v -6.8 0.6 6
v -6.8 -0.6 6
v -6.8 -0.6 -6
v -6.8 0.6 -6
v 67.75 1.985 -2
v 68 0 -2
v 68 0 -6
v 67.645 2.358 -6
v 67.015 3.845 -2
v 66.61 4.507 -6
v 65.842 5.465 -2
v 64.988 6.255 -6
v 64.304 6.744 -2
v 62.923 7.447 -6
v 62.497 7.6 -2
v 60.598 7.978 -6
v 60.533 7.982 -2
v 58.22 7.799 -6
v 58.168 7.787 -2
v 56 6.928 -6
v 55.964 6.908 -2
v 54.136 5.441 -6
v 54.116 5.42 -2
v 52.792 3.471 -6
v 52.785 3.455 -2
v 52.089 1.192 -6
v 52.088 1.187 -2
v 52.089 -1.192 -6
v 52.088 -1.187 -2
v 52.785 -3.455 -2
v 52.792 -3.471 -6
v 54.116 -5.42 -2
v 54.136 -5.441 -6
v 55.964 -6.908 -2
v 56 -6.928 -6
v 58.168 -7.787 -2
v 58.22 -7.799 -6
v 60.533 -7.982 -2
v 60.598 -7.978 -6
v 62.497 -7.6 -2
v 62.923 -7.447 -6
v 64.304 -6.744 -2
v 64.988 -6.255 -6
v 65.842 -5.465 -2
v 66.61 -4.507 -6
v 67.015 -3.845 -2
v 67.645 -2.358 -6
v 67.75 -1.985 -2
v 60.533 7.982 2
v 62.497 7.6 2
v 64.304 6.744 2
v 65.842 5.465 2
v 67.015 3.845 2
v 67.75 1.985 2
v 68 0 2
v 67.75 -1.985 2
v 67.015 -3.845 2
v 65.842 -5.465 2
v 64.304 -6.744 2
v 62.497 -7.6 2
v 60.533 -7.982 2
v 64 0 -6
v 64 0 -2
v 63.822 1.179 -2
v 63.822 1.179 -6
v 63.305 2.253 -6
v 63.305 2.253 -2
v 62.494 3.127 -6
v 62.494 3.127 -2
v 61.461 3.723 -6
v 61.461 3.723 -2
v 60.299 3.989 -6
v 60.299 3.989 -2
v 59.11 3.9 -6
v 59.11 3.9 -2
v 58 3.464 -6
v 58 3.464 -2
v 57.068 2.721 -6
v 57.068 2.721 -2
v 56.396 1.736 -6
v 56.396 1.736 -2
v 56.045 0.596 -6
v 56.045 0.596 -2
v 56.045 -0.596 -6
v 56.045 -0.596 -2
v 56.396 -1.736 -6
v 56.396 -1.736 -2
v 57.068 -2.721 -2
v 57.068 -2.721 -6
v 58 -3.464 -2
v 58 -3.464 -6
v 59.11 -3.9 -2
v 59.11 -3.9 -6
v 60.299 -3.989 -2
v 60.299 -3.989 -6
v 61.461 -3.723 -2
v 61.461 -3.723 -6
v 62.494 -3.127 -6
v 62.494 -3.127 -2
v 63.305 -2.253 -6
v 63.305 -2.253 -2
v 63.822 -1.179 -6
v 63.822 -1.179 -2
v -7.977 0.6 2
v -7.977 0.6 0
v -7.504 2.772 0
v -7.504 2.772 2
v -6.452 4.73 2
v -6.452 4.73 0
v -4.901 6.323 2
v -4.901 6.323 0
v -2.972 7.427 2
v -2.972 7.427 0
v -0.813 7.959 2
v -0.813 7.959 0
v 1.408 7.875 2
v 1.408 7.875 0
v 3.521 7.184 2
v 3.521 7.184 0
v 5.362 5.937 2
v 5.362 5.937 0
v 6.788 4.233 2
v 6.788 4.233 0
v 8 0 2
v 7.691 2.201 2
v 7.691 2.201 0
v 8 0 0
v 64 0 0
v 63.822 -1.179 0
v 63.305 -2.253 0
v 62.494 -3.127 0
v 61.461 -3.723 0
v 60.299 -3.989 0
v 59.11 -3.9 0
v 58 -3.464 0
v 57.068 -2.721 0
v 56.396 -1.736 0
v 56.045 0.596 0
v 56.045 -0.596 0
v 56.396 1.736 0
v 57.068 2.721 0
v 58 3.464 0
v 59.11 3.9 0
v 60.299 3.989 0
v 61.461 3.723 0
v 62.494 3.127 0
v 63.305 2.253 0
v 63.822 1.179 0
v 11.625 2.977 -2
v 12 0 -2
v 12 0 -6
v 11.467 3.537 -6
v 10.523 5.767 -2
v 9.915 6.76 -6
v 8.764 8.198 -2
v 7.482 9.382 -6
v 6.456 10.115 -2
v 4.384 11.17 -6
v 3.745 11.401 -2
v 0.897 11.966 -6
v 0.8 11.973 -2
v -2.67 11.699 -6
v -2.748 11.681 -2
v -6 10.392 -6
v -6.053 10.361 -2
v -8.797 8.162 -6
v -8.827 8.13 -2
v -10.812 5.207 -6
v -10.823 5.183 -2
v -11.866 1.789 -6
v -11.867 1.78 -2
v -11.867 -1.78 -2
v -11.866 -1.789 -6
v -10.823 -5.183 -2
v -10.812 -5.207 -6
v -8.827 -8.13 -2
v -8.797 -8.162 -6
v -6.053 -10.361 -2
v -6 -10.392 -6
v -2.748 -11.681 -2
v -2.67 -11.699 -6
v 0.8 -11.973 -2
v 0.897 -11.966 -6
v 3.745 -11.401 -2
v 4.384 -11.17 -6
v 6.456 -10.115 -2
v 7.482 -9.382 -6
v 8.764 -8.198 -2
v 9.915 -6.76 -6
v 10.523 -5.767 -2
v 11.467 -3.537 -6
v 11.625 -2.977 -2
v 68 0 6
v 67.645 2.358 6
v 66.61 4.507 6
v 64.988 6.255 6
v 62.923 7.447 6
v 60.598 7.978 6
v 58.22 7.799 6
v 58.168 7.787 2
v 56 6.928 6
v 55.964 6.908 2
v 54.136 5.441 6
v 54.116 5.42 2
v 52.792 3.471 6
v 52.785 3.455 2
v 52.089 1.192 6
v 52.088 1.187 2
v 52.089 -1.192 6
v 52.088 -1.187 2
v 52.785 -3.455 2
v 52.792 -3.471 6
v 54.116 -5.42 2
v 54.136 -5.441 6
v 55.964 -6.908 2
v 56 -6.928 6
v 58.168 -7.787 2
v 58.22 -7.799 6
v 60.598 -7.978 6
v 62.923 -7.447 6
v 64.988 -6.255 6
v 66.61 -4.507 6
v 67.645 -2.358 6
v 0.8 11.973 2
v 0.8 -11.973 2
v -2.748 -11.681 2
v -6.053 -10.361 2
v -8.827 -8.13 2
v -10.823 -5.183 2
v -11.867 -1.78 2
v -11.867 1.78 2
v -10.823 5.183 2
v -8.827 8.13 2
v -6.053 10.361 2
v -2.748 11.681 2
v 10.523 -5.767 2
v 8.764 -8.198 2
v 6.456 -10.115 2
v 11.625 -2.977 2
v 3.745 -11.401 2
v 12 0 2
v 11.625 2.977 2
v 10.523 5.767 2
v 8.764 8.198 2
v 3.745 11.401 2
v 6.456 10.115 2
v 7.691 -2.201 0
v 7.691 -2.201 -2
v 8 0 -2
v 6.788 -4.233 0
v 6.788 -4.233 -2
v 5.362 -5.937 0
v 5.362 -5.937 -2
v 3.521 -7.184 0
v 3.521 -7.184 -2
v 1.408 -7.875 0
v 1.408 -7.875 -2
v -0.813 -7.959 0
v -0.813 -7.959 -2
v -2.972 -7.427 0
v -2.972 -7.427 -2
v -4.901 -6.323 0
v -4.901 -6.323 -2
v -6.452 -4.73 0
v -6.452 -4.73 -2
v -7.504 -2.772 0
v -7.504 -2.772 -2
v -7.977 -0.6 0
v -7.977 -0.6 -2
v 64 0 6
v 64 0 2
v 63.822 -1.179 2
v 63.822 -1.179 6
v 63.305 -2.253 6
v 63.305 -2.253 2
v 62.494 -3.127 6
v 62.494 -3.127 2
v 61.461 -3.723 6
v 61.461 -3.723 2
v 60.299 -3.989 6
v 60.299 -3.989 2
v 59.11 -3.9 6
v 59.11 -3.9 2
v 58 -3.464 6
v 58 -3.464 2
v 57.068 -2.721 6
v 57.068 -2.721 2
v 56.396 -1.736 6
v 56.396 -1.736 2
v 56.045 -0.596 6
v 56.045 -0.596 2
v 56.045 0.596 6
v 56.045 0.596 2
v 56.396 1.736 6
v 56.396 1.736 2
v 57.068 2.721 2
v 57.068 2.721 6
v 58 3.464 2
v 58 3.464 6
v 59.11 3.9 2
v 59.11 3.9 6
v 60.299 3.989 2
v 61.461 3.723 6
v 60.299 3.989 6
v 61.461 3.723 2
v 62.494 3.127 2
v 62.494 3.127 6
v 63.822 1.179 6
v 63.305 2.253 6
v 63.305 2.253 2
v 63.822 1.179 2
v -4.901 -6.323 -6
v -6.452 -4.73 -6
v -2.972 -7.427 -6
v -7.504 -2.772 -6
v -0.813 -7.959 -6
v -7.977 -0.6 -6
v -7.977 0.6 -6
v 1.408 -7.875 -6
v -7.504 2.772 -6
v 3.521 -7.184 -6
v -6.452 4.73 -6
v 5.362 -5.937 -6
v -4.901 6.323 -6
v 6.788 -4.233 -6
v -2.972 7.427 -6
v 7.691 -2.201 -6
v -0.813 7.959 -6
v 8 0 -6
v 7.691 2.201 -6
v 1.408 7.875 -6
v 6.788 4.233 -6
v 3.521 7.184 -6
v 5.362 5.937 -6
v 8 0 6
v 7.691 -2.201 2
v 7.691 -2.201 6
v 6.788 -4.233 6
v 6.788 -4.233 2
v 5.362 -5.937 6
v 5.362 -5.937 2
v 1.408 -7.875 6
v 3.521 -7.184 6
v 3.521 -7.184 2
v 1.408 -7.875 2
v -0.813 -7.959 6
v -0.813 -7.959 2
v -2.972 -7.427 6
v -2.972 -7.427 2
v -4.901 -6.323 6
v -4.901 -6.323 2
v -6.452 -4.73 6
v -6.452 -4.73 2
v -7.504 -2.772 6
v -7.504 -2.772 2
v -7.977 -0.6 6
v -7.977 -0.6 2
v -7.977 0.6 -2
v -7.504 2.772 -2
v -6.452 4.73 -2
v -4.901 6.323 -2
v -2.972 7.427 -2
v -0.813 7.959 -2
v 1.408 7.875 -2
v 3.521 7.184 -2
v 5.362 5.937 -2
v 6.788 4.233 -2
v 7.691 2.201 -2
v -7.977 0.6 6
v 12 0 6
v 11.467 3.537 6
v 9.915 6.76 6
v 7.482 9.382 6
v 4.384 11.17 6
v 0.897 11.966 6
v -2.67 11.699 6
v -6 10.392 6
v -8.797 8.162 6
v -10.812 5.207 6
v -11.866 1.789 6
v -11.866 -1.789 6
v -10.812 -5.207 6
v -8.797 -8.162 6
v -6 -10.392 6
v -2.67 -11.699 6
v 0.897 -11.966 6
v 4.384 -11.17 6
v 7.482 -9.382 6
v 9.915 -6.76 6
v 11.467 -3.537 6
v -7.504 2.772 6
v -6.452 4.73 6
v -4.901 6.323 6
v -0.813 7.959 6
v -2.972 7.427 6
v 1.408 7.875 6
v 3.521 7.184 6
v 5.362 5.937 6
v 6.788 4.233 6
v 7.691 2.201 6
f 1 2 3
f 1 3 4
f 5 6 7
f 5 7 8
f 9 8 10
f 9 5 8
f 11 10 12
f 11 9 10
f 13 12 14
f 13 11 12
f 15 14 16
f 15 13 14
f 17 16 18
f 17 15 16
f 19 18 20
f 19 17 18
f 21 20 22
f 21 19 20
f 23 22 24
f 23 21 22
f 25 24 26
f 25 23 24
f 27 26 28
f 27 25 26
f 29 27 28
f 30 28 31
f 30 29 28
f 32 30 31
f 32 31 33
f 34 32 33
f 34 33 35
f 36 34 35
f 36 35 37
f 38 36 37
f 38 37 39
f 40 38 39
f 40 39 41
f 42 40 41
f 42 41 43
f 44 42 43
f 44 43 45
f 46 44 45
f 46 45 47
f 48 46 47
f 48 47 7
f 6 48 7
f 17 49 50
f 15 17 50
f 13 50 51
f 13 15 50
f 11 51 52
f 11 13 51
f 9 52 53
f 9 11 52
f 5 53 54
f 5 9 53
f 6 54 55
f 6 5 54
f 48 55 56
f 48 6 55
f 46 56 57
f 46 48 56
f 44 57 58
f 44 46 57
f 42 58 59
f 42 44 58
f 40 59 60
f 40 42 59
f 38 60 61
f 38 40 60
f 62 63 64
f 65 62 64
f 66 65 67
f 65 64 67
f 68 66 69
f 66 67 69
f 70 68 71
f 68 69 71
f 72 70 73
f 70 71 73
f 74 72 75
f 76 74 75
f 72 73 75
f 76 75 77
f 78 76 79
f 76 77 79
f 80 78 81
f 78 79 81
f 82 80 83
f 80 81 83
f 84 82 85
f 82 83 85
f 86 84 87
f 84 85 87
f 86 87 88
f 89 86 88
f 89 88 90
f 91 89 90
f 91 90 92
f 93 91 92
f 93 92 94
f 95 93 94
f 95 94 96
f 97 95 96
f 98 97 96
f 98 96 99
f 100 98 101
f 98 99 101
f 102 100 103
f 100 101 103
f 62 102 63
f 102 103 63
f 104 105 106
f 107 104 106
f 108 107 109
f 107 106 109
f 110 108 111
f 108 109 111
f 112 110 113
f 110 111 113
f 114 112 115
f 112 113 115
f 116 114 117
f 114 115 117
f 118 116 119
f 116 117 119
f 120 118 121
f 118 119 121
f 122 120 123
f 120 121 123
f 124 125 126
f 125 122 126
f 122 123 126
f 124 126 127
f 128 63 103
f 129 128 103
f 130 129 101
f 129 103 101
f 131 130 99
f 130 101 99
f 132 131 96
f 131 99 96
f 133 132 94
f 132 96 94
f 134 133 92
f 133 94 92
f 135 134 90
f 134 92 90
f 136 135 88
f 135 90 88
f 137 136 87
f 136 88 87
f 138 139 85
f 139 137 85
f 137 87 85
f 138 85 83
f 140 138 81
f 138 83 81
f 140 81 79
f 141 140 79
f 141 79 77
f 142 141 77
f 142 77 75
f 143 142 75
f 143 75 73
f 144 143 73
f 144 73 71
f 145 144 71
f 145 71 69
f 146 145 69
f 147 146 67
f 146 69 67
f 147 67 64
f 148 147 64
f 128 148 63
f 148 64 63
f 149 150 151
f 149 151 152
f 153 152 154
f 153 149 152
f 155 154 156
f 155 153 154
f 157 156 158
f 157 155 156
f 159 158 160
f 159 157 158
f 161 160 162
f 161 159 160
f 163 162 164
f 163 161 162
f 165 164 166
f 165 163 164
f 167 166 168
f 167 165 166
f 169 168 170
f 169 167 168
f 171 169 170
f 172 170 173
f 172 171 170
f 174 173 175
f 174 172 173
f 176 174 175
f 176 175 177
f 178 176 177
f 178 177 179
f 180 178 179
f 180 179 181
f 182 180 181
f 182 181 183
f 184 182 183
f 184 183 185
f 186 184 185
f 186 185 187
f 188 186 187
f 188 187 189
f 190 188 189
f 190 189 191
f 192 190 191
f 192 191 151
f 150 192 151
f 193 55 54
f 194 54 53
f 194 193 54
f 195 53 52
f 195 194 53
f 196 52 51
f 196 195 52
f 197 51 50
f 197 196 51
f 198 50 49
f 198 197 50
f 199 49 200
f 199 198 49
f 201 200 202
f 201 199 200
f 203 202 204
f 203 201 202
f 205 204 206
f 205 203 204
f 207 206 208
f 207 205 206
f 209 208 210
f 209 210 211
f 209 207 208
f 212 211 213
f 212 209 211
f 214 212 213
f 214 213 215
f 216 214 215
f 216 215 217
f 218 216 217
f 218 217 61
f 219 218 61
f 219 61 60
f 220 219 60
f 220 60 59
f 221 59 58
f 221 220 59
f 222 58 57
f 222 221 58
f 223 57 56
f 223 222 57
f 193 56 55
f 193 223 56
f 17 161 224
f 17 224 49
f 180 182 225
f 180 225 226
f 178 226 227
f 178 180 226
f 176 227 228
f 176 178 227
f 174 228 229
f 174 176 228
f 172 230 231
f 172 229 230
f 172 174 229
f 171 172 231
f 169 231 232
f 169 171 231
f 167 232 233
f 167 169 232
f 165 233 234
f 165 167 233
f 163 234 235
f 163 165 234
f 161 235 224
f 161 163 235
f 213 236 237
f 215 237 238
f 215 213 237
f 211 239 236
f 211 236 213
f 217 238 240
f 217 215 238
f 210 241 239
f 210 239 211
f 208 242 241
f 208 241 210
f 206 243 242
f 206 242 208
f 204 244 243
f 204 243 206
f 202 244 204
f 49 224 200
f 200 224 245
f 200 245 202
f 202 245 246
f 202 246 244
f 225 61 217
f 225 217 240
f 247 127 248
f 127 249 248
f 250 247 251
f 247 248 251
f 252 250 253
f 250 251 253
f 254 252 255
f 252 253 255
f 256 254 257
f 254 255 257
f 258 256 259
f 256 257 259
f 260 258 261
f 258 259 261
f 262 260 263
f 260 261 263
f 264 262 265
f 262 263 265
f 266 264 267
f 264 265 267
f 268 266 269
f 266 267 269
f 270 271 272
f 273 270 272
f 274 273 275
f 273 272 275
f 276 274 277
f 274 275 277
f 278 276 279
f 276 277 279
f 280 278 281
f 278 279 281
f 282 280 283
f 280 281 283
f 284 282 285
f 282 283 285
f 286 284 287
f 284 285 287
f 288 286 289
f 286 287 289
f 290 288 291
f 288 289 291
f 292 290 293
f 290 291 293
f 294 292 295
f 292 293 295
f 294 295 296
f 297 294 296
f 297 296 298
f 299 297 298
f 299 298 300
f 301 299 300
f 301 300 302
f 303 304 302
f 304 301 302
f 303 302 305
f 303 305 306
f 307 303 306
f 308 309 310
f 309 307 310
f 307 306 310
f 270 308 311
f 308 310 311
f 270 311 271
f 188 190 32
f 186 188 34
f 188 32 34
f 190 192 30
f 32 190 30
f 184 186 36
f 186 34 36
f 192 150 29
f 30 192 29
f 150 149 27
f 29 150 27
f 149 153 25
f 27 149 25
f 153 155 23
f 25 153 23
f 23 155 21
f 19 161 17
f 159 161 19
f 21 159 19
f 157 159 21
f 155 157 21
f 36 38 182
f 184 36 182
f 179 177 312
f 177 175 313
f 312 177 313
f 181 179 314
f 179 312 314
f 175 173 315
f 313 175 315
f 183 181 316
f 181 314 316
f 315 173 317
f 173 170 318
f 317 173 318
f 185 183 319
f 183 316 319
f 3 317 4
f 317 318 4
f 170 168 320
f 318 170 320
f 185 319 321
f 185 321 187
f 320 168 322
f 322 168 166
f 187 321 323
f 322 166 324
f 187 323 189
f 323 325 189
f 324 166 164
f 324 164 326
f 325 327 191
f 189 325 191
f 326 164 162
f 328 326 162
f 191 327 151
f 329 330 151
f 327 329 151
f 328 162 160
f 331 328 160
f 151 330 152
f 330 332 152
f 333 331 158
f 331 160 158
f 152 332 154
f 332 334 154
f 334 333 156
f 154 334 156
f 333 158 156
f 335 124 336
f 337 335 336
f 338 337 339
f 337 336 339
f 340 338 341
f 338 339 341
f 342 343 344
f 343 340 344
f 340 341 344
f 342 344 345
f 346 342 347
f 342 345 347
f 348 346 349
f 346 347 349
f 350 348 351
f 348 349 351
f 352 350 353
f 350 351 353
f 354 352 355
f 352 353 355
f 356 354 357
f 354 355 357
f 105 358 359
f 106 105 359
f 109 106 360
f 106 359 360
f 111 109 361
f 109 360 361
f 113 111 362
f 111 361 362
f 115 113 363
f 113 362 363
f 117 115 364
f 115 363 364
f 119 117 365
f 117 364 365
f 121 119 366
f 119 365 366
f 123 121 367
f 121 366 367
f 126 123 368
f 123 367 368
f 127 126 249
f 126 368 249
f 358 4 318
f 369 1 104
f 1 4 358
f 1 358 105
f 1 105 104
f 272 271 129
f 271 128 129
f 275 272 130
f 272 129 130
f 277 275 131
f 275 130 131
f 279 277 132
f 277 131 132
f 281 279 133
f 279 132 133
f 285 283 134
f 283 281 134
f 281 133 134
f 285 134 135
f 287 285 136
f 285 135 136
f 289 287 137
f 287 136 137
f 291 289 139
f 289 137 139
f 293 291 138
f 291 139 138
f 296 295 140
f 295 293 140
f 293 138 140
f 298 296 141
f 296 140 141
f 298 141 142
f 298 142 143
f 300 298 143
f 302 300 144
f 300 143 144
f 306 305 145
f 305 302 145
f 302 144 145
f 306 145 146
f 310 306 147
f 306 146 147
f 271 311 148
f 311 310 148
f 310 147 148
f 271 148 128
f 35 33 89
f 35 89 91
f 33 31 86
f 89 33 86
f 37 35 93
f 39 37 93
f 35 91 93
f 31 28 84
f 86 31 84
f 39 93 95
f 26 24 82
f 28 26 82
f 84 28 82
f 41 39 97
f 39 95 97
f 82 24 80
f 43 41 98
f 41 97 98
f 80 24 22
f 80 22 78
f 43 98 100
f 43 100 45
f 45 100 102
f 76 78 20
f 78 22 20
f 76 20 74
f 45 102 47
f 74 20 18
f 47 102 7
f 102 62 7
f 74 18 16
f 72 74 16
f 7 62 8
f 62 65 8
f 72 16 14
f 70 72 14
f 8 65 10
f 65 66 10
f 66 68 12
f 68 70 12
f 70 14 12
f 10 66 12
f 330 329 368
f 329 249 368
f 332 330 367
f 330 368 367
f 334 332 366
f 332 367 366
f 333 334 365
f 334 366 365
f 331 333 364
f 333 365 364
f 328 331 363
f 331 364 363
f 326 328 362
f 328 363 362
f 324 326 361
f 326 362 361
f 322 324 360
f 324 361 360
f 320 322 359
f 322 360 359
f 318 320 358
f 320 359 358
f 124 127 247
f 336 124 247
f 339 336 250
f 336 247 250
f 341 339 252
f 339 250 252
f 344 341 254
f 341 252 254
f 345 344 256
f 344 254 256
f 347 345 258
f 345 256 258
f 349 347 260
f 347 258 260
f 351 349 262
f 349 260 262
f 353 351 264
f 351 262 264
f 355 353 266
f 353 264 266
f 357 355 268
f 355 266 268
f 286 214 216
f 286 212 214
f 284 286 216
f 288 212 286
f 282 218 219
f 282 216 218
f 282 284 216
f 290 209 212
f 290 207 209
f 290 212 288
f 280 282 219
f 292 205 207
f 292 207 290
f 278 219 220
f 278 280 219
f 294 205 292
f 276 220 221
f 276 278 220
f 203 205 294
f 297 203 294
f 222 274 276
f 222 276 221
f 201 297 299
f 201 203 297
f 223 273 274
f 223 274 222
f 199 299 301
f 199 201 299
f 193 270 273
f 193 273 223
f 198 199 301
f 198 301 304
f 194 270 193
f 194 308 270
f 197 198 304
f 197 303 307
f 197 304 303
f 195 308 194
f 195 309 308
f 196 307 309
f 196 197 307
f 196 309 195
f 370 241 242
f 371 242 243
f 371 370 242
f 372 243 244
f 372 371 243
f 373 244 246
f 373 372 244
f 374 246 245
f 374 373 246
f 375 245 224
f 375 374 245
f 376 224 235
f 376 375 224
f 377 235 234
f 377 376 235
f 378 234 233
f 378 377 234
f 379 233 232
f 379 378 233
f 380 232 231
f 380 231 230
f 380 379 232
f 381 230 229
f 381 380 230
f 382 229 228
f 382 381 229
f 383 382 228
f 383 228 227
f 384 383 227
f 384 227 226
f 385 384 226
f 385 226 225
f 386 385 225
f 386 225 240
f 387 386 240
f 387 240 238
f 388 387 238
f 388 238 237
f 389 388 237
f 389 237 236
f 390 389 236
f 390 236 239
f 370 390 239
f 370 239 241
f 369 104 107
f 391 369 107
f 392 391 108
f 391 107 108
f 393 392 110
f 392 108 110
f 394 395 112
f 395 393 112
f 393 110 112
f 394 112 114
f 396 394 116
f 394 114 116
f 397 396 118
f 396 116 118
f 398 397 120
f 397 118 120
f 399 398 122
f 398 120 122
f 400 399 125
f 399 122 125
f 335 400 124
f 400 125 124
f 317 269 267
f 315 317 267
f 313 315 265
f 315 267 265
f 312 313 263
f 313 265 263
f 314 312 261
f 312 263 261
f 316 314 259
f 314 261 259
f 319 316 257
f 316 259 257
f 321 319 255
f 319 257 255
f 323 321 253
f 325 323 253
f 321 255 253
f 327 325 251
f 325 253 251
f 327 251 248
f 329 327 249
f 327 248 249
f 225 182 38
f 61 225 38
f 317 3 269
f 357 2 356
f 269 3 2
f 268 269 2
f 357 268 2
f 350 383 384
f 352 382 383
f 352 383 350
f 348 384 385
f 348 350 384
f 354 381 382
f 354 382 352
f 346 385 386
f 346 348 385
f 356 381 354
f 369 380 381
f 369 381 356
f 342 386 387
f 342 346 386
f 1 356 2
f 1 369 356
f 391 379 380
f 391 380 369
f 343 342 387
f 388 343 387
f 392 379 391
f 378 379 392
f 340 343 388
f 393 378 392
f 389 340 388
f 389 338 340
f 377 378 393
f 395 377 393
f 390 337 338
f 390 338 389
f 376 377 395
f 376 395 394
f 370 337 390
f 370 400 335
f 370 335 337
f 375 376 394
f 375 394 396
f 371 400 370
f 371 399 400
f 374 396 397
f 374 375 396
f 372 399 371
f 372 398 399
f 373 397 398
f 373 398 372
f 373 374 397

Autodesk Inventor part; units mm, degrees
ref_plane "YZ Plane" through (0, 0, 0) normal (1, 0, 0) x (0, 1, 0)
ref_plane "XZ Plane" through (0, 0, 0) normal (0, 1, 0) x (-1, 0, 0)
ref_plane "XY Plane" through (0, 0, 0) normal (0, 0, 1) x (1, 0, 0)
sketch "Esboço1" plane through (0, 0, 0) normal (0, 0, 1) x (1, 0, 0)
  circle A0 centre (0, 0) radius 8
  arc A1 (0.8, 11.9733) -> (0.8, -11.9733) centre (0, 0) ccw
  arc A2 (60.5333, -7.9822) -> (60.5333, 7.9822) centre (60, 0) ccw
  circle A3 centre (60, 0) radius 4
  line L0 (0.8, 11.9733) -> (60.5333, 7.9822)
  line L1 (0, 0) -> (60, 0) construction
  line L2 (0.8, -11.9733) -> (60.5333, -7.9822)
  point P0 (-9.6543, 12.6718)
  point P1 (71.6078, 7.2423)
  point P2 (-9.6543, -12.6718)
  point P3 (71.6078, -7.2423)
  dimension "d0" = 16
  dimension "d1" = 24
  dimension "d2" = 16
  dimension "d3" = 8
  dimension "d4" = 60
extrude "Extrusão1" add sketch "Esboço1" along normal mid plane 4
sketch "Esboço2" plane through (0, 0, 0) normal (0, 0, 1) x (1, 0, 0)
  circle A0 centre (0, 0) radius 8
  circle A1 centre (0, 0) radius 12
  circle A2 centre (60, 0) radius 4 projected
  circle A3 centre (60, 0) radius 4
  line L0 (60.5333, 7.9822) -> (0.8, 11.9733) projected
  circle A4 centre (60, 0) radius 8
extrude "Extrusão2" add sketch "Esboço2" along normal mid plane 12
sketch "Esboço3" plane through (0, 0, 6) normal (0, 0, 1) x (1, 0, 0)
  circle A0 centre (0, 0) radius 8 projected
  line L0 (-8, 0) -> (-6.8, 0)
  line L1 (-6.8, 0) -> (-6.8, 0.6)
  line L2 (-6.8, 0.6) -> (-8, 0.6)
  line L3 (-8, 0.6) -> (-8, 0)
  line L4 (-8, 0) -> (-6.8, 0)
  line L5 (-6.8, 0) -> (-6.8, -0.6)
  line L6 (-6.8, -0.6) -> (-8, -0.6)
  line L7 (-8, -0.6) -> (-8, 0)
  dimension "d9" = 1.2
  dimension "d10" = 0.6
  dimension "d11" = 1.2
  dimension "d12" = 0.6
extrude "Extrusão3" add sketch "Esboço3" against normal blind 12 contours L2 L1 L0 A0 | A0 L3 L2 | L6 L7 A0 | A0 L0 L5 L6
properties part number "Manipulo"
